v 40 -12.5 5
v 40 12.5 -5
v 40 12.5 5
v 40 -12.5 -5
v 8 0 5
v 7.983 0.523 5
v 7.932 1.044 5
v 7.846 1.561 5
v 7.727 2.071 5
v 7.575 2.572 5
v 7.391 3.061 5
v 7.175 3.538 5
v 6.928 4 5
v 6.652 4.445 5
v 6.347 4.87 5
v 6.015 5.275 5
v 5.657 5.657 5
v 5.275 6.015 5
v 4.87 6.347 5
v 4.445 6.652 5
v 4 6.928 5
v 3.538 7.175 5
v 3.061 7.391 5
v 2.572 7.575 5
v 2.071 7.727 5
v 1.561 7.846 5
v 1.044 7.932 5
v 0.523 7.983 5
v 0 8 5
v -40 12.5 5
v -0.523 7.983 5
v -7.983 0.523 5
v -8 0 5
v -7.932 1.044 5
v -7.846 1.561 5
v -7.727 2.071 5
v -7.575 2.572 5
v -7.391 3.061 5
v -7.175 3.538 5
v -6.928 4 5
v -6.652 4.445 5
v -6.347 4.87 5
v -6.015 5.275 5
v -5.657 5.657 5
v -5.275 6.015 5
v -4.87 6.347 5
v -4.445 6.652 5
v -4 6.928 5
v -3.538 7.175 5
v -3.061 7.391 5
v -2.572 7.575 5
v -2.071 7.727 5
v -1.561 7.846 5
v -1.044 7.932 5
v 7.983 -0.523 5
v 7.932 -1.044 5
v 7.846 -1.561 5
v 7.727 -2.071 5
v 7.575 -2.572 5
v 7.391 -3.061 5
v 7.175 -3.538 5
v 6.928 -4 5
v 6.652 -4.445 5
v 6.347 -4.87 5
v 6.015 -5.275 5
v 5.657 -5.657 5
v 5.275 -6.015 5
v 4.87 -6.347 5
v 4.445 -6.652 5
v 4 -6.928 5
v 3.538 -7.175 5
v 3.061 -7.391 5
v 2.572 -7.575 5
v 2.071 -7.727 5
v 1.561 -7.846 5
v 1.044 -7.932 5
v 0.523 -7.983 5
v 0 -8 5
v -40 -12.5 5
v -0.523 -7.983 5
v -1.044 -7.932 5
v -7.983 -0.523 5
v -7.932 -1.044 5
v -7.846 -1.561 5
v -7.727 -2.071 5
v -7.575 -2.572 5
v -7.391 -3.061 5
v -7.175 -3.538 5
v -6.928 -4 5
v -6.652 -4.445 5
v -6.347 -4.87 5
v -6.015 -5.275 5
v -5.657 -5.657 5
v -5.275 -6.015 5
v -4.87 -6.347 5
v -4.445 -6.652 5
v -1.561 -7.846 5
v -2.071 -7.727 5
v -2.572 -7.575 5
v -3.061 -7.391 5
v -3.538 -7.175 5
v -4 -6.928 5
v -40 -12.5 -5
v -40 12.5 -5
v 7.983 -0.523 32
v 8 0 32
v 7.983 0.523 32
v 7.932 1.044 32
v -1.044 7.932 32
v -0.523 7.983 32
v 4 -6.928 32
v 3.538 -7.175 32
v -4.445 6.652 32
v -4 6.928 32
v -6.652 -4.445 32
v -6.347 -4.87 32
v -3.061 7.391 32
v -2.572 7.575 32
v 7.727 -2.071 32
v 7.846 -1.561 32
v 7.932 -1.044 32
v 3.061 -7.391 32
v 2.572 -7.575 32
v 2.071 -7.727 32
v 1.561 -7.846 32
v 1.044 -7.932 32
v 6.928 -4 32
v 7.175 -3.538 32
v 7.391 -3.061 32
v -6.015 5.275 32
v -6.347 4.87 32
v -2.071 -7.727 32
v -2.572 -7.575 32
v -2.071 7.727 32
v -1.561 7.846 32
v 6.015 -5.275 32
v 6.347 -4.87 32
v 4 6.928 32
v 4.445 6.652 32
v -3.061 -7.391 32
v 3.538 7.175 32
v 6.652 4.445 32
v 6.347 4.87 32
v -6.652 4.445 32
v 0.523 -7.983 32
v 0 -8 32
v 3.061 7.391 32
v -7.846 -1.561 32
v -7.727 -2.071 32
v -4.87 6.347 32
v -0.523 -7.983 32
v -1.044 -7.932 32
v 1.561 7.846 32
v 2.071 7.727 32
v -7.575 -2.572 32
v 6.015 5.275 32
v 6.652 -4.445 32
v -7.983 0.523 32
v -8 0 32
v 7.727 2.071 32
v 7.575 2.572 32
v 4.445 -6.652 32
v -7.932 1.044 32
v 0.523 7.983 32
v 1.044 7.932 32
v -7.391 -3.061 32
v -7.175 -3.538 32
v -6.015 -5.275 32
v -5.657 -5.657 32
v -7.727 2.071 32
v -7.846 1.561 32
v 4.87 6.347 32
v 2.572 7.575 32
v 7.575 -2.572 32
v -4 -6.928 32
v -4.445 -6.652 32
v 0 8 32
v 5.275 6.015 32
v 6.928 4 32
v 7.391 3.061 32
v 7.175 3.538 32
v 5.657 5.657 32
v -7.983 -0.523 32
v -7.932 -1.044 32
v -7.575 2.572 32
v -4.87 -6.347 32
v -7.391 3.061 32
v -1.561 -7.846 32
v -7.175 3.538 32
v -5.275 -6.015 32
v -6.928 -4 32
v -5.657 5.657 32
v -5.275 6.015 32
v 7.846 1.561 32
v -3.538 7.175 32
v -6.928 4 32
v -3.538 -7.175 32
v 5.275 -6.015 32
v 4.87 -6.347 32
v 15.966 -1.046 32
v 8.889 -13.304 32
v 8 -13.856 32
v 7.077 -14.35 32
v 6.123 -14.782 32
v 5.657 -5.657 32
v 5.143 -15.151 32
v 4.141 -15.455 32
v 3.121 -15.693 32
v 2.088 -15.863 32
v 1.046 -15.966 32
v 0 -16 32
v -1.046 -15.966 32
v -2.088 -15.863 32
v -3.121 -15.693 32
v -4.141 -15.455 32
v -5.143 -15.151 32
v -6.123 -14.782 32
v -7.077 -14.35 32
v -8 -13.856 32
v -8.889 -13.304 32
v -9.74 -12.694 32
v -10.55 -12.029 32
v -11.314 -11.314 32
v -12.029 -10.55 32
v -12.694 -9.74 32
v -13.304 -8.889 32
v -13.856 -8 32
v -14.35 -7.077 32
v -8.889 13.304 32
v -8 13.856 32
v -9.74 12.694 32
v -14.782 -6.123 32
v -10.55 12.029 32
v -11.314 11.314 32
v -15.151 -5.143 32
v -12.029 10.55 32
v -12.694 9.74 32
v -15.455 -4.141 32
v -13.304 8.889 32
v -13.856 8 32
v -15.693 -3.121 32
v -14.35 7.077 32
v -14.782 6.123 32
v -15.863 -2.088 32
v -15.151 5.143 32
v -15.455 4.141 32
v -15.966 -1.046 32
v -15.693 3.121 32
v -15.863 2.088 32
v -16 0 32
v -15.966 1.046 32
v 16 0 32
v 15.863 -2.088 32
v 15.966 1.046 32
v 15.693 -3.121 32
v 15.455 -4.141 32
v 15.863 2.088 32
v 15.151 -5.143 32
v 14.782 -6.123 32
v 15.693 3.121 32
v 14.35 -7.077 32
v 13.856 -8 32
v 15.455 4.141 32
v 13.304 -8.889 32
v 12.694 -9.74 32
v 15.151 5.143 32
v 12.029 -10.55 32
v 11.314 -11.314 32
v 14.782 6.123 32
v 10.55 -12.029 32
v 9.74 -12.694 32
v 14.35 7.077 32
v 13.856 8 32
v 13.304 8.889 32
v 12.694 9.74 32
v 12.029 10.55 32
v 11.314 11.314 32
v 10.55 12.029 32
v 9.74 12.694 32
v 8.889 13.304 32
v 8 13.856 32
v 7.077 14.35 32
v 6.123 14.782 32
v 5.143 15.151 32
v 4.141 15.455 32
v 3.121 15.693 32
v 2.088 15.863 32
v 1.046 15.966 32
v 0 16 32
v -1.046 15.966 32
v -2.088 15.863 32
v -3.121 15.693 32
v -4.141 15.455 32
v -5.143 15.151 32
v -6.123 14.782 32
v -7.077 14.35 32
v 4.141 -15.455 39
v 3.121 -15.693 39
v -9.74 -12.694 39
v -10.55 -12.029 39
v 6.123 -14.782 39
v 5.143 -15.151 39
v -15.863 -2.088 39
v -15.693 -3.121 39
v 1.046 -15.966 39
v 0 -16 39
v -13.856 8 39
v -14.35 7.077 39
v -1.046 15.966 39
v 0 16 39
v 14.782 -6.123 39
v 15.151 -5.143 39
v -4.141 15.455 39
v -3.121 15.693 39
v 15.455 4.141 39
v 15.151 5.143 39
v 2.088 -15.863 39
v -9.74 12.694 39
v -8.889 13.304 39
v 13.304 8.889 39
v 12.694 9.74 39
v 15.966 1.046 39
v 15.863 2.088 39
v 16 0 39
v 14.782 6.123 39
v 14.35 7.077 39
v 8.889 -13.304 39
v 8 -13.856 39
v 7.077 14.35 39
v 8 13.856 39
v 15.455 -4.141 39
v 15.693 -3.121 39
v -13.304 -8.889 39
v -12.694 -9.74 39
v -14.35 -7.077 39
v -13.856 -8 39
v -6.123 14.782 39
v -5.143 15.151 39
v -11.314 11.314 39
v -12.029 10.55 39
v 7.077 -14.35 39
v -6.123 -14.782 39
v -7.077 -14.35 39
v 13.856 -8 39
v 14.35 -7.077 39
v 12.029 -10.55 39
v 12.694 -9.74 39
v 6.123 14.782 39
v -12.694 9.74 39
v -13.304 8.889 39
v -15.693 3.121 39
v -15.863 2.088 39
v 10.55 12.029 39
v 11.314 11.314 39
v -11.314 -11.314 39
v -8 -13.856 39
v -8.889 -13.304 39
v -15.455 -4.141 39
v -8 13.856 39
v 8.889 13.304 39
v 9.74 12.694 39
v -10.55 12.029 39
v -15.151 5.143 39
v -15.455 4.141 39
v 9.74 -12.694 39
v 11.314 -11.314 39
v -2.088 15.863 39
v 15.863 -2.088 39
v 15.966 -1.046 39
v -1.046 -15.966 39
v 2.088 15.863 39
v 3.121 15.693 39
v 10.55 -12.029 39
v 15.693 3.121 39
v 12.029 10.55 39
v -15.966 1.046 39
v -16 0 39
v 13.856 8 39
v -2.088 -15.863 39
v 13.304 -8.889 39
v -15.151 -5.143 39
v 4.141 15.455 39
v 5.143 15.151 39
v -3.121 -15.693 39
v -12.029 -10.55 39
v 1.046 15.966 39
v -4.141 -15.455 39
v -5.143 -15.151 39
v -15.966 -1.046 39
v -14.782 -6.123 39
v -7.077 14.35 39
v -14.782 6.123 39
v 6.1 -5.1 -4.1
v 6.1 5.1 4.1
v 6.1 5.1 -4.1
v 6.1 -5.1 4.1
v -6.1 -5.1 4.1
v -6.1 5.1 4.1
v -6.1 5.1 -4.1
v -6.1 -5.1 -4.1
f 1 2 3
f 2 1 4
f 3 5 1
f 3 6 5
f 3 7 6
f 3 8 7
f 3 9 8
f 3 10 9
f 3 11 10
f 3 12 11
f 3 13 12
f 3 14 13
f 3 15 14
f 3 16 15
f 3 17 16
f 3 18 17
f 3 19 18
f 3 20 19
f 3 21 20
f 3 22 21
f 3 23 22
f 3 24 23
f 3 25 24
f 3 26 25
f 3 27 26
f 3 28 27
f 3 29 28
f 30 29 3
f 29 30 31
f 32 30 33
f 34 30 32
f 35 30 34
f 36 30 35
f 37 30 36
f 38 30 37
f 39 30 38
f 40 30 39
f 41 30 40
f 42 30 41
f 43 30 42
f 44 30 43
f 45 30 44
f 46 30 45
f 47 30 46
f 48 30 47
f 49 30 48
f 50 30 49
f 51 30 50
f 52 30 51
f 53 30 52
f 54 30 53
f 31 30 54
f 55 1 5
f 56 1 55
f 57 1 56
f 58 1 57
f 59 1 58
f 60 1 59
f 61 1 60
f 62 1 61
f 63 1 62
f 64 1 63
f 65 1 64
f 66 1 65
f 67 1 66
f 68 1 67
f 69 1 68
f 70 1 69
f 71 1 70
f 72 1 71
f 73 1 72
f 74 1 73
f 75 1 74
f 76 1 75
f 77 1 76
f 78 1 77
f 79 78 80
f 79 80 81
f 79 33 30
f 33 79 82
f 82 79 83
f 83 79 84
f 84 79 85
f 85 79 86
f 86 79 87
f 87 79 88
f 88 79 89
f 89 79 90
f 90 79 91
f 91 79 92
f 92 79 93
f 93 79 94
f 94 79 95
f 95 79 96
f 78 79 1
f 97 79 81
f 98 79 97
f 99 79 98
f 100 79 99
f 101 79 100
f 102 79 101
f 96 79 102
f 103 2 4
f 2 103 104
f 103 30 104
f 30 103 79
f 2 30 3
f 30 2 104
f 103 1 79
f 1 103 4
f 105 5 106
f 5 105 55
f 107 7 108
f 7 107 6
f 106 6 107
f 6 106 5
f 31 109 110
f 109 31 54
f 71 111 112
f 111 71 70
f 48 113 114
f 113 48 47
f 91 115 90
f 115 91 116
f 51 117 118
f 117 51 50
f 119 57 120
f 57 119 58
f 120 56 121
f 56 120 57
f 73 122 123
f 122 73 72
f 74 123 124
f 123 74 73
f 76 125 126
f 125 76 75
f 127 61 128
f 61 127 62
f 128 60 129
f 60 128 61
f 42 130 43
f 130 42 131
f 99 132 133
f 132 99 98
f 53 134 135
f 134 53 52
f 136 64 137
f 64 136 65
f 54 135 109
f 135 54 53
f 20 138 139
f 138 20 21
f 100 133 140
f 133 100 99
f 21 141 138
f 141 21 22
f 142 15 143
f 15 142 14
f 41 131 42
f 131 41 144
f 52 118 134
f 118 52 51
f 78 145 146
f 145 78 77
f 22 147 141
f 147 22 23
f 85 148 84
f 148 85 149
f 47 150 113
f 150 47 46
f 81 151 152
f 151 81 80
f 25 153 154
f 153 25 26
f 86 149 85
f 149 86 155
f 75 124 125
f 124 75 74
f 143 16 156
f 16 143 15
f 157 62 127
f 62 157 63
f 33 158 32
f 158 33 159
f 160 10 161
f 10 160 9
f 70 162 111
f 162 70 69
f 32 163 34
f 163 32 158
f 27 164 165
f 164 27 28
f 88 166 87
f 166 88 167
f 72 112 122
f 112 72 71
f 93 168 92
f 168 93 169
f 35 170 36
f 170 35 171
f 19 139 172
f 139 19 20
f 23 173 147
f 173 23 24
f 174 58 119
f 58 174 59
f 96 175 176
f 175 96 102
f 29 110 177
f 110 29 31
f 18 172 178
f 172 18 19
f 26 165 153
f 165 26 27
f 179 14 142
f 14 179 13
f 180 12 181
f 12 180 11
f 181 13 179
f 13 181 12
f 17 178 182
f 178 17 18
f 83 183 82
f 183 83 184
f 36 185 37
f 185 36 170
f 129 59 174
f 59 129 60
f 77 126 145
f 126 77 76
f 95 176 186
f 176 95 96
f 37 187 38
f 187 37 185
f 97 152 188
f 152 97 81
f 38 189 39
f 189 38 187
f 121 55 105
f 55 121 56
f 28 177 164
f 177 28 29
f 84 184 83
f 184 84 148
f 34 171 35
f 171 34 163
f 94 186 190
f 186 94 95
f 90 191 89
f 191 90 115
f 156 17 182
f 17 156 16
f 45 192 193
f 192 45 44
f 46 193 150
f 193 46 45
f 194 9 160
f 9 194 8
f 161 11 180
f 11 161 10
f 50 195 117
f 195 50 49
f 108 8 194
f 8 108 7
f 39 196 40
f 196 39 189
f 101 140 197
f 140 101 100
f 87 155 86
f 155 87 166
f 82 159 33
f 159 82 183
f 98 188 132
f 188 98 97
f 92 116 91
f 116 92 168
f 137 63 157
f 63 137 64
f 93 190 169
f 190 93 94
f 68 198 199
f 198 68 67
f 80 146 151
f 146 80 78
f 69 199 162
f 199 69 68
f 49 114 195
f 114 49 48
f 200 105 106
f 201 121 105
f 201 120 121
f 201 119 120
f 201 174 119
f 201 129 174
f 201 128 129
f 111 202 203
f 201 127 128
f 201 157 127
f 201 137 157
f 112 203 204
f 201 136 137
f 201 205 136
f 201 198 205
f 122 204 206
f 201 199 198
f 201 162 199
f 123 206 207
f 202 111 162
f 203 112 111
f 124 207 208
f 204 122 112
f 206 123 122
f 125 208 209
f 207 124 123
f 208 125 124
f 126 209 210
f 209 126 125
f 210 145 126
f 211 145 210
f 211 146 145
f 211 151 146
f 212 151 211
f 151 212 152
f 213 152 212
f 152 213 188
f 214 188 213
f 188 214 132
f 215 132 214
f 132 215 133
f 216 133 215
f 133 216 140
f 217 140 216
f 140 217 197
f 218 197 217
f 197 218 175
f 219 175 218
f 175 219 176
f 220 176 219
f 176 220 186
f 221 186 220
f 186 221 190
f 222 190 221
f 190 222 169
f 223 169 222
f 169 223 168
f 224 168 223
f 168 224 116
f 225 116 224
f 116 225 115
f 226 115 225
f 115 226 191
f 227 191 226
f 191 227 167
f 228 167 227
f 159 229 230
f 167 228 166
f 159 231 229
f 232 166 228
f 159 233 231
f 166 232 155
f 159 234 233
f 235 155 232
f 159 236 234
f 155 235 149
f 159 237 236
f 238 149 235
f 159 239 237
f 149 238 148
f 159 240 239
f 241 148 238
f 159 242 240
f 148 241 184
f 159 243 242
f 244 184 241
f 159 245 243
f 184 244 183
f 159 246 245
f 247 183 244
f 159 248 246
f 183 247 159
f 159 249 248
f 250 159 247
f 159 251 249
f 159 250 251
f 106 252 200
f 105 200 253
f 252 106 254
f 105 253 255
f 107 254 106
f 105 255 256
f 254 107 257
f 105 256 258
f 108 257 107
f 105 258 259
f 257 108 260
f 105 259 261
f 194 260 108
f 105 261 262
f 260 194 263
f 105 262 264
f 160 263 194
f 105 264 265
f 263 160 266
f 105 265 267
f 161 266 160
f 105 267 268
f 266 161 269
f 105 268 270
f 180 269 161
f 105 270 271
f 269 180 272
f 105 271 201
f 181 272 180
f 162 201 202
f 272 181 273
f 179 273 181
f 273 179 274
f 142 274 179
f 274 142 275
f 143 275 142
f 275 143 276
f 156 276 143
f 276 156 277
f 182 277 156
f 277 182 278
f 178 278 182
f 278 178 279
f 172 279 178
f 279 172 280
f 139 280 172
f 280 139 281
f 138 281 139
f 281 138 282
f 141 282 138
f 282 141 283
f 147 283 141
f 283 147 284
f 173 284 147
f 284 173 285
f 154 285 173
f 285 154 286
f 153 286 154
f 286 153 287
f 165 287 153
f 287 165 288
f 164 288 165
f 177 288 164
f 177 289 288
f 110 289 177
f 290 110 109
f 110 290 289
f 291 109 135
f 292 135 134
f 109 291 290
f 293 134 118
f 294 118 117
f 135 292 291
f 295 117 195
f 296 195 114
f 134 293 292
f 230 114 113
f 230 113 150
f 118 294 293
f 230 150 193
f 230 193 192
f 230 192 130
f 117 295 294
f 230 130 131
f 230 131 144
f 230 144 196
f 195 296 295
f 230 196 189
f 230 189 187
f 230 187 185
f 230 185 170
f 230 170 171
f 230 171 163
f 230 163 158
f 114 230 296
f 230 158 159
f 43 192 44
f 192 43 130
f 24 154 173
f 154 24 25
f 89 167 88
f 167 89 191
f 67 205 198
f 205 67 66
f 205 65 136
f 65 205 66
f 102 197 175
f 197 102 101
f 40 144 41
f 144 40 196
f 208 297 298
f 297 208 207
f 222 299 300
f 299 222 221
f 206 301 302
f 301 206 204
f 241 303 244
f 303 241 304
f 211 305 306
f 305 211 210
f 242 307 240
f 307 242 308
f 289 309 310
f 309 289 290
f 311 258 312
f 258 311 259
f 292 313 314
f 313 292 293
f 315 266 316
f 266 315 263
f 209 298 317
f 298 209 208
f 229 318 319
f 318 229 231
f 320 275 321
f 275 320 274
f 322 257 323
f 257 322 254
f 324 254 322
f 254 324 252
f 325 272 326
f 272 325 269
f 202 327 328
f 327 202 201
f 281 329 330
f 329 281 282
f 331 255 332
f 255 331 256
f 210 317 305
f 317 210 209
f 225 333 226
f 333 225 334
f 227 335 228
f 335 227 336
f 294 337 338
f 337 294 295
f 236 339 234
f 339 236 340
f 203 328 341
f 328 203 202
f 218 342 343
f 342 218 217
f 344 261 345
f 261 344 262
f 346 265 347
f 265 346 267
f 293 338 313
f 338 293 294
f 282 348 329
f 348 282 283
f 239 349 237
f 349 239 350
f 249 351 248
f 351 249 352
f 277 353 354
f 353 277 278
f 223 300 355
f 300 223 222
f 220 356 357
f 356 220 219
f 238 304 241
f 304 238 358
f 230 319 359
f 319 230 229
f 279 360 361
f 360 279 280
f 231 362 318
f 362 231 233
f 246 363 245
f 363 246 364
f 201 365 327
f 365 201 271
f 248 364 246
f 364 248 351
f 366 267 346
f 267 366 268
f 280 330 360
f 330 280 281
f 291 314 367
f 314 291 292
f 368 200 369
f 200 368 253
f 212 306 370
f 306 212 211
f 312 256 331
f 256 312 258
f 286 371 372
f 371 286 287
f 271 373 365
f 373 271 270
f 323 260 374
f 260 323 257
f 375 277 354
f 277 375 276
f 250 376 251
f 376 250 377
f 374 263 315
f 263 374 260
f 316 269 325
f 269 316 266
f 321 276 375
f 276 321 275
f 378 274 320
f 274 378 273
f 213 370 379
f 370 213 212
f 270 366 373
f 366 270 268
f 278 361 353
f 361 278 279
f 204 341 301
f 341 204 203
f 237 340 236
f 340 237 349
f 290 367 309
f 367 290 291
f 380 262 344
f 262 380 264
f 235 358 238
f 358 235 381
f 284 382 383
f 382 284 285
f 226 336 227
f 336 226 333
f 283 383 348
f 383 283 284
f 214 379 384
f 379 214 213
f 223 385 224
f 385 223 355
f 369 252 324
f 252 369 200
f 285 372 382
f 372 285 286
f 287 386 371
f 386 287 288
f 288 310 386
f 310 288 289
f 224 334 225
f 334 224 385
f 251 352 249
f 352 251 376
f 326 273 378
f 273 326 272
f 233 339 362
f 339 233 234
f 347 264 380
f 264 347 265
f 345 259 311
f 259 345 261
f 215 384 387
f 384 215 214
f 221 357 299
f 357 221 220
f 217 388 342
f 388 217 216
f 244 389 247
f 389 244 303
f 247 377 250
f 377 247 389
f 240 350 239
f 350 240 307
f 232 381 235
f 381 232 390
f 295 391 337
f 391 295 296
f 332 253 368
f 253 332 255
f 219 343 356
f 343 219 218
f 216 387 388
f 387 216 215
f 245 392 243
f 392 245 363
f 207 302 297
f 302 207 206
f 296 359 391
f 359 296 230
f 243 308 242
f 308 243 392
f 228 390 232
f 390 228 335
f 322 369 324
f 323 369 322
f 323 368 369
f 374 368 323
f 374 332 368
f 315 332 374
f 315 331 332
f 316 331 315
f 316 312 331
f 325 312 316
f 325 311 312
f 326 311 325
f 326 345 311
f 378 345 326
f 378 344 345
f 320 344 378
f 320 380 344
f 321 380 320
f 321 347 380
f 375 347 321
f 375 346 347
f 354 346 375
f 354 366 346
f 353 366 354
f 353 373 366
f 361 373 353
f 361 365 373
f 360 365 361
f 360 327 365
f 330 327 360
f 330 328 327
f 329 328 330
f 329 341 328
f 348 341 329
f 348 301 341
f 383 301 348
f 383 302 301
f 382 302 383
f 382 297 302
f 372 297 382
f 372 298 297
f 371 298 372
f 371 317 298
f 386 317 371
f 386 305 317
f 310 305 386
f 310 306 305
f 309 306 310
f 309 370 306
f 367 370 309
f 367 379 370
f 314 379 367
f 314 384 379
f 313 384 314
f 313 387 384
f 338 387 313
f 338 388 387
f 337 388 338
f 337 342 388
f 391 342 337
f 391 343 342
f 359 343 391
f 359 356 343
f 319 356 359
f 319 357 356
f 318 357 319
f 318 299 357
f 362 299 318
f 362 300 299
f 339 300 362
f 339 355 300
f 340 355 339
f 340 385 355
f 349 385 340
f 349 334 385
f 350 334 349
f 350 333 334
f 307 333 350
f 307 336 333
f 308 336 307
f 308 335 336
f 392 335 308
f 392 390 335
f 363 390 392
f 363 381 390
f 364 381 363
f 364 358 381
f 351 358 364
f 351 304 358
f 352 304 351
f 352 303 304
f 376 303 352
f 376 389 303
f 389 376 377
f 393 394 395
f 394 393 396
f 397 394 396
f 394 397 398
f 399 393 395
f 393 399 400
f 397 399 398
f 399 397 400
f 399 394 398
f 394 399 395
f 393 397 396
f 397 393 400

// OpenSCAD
// Dimensioned reconstruction of an ordinary stir-bar restrainer grip.
// Millimetres. Original task geometry; not OEM CAD.
// Core pocket: 12 along local X, 10 along Y and 8 along Z (magnetization).
// Print the two halves and encapsulate the magnet permanently; no loose magnet
// or exposed adhesive is used in a trial. Field calibration is required.
$fn=96;
part="assembly"; // "assembly", "upper", "lower", "core"

module exterior() {
    union() {
        cube([80,25,10],center=true);
        translate([0,0,18.5]) cylinder(d=16,h=27,center=true);
        translate([0,0,35.5]) cylinder(d=32,h=7,center=true);
    }
}
module case() {
    difference() {
        exterior();
        cube([12.2,10.2,8.2],center=true);
    }
}
if(part=="assembly") case();
if(part=="upper") intersection() {
    case(); translate([0,0,50]) cube([100,100,100],center=true);
}
if(part=="lower") intersection() {
    case(); translate([0,0,-50]) cube([100,100,100],center=true);
}
if(part=="core") cube([12,10,8],center=true);
